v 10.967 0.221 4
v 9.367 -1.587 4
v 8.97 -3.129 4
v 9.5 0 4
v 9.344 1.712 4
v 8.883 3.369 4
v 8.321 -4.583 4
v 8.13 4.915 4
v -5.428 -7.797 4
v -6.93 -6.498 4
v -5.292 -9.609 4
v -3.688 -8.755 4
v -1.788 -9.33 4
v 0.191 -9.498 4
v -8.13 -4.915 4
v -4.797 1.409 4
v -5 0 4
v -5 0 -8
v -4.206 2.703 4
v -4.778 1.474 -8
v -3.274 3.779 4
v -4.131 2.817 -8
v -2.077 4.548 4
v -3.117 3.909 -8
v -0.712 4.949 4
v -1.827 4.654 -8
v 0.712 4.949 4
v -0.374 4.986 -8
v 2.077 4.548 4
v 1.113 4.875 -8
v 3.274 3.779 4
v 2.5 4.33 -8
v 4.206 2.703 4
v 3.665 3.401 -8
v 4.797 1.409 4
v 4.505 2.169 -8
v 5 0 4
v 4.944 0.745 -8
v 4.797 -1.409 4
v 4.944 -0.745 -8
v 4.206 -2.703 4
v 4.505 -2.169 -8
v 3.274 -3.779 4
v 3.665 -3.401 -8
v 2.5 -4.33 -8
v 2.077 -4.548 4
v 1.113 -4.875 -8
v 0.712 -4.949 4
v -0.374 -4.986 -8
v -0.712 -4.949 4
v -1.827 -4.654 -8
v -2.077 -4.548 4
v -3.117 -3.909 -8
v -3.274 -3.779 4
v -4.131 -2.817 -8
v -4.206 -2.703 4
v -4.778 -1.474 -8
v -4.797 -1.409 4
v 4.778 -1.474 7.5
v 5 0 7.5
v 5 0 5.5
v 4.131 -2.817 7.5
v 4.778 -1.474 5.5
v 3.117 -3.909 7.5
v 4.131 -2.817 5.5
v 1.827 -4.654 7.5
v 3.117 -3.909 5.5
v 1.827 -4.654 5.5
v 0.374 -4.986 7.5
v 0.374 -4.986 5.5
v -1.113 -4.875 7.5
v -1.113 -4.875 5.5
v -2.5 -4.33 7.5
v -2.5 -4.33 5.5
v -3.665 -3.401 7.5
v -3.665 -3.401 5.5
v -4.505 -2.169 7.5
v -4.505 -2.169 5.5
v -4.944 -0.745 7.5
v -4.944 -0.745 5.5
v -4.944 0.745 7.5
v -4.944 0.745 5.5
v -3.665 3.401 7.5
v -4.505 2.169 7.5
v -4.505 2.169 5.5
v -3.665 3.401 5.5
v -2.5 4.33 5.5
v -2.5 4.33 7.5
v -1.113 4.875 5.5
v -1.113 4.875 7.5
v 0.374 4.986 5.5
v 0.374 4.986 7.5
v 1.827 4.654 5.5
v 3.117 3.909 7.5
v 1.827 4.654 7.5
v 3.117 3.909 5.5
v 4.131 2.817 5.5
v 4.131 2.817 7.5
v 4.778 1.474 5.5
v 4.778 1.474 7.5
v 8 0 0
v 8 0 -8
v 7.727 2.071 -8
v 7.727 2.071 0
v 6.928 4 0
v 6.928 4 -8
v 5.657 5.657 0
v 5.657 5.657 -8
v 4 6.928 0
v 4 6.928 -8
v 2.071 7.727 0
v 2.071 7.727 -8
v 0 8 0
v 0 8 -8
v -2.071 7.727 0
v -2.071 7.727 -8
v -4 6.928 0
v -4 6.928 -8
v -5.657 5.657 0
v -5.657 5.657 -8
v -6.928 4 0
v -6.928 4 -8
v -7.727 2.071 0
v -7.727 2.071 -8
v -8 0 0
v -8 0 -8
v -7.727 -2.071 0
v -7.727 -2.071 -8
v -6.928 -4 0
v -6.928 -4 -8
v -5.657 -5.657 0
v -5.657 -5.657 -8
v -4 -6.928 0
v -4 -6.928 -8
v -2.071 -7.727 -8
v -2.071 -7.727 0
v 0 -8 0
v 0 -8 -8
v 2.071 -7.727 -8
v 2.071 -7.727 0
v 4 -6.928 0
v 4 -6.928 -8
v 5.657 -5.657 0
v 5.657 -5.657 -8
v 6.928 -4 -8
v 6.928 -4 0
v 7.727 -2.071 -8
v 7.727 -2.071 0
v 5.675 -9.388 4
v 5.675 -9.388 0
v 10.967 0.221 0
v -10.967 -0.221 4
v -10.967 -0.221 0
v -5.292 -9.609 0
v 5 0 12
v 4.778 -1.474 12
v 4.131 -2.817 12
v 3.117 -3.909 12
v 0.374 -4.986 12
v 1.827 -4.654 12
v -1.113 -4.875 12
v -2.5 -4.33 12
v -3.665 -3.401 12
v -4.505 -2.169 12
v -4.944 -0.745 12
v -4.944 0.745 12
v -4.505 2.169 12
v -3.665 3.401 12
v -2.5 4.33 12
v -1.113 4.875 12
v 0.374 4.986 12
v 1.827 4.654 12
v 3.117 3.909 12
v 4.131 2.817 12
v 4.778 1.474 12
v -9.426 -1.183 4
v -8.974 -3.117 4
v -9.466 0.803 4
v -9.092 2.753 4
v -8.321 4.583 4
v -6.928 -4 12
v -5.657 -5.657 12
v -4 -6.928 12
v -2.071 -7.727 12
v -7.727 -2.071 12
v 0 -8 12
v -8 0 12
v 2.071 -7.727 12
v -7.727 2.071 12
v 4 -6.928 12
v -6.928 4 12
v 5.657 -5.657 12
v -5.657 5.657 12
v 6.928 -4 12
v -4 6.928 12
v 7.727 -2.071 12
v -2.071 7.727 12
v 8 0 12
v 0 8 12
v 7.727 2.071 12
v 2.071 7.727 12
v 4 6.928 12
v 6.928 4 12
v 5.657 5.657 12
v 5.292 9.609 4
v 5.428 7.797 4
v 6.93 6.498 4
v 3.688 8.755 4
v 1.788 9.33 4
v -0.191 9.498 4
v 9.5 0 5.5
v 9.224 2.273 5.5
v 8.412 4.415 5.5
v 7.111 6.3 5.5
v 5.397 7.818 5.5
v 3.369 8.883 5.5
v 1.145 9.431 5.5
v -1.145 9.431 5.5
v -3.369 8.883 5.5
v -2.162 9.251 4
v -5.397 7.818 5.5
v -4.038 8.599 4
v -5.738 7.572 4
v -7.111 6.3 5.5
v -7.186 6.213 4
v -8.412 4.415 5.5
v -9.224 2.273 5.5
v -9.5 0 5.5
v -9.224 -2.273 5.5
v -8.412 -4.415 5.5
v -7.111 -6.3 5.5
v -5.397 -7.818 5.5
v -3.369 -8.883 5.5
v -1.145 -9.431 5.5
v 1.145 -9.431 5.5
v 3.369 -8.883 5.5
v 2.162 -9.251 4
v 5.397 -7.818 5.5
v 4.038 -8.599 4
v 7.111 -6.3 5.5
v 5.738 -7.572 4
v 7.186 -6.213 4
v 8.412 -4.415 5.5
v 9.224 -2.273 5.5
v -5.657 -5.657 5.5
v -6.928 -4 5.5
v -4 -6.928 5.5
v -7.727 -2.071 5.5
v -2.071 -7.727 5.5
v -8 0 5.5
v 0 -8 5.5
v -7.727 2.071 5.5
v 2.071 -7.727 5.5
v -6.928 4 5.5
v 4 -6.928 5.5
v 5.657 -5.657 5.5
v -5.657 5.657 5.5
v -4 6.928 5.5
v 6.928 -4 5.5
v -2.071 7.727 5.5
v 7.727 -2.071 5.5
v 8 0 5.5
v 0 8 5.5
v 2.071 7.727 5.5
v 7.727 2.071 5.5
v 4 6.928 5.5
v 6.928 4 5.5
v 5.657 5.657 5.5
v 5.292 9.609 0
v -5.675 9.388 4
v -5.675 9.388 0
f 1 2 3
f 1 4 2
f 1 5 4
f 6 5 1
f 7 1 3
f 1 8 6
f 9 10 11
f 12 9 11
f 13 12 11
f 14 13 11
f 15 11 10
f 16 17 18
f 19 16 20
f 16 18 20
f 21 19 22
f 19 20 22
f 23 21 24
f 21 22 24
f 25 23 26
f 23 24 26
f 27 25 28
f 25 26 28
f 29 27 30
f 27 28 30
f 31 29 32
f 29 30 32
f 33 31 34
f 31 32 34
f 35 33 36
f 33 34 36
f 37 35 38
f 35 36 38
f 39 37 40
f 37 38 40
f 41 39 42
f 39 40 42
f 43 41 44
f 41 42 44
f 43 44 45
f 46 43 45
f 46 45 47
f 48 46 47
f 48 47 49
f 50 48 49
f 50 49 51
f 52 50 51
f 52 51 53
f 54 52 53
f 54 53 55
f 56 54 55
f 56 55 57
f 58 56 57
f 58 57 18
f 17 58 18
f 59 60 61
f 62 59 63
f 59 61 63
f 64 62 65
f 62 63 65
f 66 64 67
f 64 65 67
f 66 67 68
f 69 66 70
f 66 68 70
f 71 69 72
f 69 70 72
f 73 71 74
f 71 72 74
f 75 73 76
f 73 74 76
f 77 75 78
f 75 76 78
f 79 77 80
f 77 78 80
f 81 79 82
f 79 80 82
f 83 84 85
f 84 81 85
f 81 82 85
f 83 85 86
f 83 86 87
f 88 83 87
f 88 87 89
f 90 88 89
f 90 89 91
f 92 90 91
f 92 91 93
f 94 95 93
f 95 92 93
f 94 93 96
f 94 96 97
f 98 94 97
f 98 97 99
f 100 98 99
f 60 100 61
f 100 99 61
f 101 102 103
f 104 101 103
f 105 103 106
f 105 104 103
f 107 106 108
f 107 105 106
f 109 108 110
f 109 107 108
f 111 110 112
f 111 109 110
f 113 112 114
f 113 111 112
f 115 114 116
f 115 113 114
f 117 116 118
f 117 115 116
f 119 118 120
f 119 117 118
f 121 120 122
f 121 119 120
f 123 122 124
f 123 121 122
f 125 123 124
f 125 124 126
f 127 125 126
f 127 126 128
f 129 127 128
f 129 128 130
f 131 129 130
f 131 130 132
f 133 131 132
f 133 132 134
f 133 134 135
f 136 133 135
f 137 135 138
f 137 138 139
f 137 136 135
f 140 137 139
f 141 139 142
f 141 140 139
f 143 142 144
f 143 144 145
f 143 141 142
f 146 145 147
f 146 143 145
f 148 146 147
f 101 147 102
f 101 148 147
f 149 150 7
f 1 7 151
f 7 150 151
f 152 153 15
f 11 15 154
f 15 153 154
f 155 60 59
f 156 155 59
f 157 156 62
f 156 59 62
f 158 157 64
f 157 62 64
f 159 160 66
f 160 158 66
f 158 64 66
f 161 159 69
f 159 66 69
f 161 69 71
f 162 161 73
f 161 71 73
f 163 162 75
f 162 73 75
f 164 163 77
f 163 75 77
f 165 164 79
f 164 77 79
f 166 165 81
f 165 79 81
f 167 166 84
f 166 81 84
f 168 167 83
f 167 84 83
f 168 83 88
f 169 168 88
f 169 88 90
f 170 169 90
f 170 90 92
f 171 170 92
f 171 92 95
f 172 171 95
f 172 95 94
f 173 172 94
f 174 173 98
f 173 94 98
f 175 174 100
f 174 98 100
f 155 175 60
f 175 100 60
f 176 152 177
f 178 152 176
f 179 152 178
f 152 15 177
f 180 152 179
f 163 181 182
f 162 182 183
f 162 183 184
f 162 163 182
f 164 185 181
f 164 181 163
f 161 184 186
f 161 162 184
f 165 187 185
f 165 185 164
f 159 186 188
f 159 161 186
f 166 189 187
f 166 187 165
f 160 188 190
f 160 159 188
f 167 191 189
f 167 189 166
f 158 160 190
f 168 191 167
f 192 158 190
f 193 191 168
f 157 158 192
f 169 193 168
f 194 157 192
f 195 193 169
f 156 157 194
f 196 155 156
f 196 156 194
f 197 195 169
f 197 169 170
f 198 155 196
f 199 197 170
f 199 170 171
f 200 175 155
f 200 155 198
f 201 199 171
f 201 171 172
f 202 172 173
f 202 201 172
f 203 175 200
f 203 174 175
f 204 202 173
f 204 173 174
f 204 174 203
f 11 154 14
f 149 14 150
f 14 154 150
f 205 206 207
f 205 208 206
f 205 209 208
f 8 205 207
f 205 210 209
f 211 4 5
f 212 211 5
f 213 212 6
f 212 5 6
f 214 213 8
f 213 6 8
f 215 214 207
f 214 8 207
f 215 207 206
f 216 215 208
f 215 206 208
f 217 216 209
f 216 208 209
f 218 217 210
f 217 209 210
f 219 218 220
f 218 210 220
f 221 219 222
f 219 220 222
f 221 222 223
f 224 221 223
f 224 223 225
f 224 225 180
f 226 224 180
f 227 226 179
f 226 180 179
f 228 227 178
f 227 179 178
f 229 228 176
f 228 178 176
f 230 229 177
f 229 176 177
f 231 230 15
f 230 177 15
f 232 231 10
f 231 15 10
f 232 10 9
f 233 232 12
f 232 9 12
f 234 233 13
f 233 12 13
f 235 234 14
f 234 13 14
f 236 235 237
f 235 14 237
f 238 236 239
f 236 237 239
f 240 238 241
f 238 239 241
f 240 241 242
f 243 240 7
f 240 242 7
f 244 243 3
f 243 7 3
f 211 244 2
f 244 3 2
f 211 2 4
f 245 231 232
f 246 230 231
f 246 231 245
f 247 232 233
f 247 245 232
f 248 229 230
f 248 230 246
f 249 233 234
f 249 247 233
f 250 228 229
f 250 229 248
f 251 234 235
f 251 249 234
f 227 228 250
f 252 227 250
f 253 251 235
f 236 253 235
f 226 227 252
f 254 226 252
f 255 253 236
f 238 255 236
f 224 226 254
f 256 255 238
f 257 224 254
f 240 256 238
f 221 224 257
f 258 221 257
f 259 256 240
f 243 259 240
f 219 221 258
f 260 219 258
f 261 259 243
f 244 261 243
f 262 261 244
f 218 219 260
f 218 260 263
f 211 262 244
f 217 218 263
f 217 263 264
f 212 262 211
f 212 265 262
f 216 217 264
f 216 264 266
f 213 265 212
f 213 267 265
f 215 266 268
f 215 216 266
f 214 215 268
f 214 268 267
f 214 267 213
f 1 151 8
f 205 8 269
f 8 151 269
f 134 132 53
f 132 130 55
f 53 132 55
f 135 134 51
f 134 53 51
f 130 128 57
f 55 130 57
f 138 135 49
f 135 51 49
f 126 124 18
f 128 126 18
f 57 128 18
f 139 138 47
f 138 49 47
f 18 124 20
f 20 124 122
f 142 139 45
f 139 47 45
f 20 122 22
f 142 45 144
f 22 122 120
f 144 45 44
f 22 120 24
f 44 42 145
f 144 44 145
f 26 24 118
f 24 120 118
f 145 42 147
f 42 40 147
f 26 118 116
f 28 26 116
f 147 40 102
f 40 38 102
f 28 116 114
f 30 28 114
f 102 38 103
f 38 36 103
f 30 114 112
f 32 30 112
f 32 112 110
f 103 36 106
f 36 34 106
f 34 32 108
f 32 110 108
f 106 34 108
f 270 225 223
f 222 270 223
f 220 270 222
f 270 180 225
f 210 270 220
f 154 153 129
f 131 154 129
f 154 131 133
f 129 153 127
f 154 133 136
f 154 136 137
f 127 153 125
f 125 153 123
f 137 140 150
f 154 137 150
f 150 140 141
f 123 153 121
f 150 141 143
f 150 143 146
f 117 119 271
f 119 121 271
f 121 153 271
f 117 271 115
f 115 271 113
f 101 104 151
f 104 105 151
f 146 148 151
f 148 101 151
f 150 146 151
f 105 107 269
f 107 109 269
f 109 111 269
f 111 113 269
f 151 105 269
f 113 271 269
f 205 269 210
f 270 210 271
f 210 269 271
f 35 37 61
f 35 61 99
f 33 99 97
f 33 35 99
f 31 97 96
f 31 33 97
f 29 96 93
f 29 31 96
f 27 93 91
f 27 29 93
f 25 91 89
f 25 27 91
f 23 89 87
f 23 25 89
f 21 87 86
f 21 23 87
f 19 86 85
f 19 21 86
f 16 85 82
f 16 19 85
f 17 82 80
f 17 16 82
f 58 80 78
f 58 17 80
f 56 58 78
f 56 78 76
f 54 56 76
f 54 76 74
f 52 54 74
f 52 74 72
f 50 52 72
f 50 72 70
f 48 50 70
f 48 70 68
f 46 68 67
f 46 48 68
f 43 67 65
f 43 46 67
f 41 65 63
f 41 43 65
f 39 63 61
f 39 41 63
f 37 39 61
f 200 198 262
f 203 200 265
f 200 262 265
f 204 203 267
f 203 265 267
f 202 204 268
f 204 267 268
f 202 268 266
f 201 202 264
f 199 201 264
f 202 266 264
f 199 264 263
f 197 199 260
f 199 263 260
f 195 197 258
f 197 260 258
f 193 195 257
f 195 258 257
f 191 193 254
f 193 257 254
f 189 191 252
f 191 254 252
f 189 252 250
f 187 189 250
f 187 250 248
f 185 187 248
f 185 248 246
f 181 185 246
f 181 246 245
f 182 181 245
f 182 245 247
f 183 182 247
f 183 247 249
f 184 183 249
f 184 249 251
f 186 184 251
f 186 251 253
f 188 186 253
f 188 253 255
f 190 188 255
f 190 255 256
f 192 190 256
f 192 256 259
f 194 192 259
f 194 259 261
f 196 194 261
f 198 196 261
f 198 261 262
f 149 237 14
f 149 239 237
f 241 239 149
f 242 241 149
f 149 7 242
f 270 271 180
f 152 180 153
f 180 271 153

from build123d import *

# Parameters (mm, degrees)
BOSS_EXTRUDE1_DEPTH = 4
SKETCH2_R           = 8
BOSS_EXTRUDE3_DEPTH = 8
SKETCH3_R           = 5
CUT_EXTRUDE2_DEPTH  = 12
SKETCH4_R           = 5
CUT_EXTRUDE3_DEPTH  = 12
SKETCH6_R           = 9.5
BOSS_EXTRUDE6_DEPTH = 1.5
SKETCH15_R          = 5
CUT_EXTRUDE8_DEPTH  = 3.5


with BuildPart() as part:
    # Sketch1 → Boss-Extrude1 (new body)
    with BuildSketch(Plane.XY):
        Polygon((5.675106298, -9.387571669), (10.967428694, 0.221000389), (5.292322396, 9.608572058), (-5.675106298, 9.387571669), (-10.967428694, -0.221000389), (-5.292322396, -9.608572058), align=None)
    boss_extrude1 = extrude(amount=BOSS_EXTRUDE1_DEPTH)

    # Sketch2 → Boss-Extrude3 (add)
    with BuildSketch(Plane.XY.offset(4)):
        Circle(SKETCH2_R)
    boss_extrude3 = extrude(amount=BOSS_EXTRUDE3_DEPTH)

    # Sketch3 → Cut-Extrude2 (cut)
    with BuildSketch(Plane.XY.offset(12)):
        Circle(SKETCH3_R)
    extrude(amount=-CUT_EXTRUDE2_DEPTH, mode=Mode.SUBTRACT)

    # Mirror2: Boss-Extrude1, Boss-Extrude3 across plane
    add(boss_extrude1.mirror(Plane(origin=(0, 0, 2), x_dir=(1, 0, 0), z_dir=(0, 0, -1))))
    add(boss_extrude3.mirror(Plane(origin=(0, 0, 2), x_dir=(1, 0, 0), z_dir=(0, 0, -1))))

    # Sketch4 → Cut-Extrude3 (cut)
    with BuildSketch(Plane(origin=(0, 0, -8), x_dir=(-1, 0, 0), z_dir=(0, 0, -1))):
        Circle(SKETCH4_R)
    extrude(amount=-CUT_EXTRUDE3_DEPTH, mode=Mode.SUBTRACT)

    # Sketch6 → Boss-Extrude6 (add)
    with BuildSketch(Plane.XY.offset(4)):
        Circle(SKETCH6_R)
    extrude(amount=BOSS_EXTRUDE6_DEPTH)

    # Sketch15 → Cut-Extrude8 (cut)
    with BuildSketch(Plane.XY.offset(4)):
        Circle(SKETCH15_R)
    extrude(amount=CUT_EXTRUDE8_DEPTH, mode=Mode.SUBTRACT)


solid = part.part
